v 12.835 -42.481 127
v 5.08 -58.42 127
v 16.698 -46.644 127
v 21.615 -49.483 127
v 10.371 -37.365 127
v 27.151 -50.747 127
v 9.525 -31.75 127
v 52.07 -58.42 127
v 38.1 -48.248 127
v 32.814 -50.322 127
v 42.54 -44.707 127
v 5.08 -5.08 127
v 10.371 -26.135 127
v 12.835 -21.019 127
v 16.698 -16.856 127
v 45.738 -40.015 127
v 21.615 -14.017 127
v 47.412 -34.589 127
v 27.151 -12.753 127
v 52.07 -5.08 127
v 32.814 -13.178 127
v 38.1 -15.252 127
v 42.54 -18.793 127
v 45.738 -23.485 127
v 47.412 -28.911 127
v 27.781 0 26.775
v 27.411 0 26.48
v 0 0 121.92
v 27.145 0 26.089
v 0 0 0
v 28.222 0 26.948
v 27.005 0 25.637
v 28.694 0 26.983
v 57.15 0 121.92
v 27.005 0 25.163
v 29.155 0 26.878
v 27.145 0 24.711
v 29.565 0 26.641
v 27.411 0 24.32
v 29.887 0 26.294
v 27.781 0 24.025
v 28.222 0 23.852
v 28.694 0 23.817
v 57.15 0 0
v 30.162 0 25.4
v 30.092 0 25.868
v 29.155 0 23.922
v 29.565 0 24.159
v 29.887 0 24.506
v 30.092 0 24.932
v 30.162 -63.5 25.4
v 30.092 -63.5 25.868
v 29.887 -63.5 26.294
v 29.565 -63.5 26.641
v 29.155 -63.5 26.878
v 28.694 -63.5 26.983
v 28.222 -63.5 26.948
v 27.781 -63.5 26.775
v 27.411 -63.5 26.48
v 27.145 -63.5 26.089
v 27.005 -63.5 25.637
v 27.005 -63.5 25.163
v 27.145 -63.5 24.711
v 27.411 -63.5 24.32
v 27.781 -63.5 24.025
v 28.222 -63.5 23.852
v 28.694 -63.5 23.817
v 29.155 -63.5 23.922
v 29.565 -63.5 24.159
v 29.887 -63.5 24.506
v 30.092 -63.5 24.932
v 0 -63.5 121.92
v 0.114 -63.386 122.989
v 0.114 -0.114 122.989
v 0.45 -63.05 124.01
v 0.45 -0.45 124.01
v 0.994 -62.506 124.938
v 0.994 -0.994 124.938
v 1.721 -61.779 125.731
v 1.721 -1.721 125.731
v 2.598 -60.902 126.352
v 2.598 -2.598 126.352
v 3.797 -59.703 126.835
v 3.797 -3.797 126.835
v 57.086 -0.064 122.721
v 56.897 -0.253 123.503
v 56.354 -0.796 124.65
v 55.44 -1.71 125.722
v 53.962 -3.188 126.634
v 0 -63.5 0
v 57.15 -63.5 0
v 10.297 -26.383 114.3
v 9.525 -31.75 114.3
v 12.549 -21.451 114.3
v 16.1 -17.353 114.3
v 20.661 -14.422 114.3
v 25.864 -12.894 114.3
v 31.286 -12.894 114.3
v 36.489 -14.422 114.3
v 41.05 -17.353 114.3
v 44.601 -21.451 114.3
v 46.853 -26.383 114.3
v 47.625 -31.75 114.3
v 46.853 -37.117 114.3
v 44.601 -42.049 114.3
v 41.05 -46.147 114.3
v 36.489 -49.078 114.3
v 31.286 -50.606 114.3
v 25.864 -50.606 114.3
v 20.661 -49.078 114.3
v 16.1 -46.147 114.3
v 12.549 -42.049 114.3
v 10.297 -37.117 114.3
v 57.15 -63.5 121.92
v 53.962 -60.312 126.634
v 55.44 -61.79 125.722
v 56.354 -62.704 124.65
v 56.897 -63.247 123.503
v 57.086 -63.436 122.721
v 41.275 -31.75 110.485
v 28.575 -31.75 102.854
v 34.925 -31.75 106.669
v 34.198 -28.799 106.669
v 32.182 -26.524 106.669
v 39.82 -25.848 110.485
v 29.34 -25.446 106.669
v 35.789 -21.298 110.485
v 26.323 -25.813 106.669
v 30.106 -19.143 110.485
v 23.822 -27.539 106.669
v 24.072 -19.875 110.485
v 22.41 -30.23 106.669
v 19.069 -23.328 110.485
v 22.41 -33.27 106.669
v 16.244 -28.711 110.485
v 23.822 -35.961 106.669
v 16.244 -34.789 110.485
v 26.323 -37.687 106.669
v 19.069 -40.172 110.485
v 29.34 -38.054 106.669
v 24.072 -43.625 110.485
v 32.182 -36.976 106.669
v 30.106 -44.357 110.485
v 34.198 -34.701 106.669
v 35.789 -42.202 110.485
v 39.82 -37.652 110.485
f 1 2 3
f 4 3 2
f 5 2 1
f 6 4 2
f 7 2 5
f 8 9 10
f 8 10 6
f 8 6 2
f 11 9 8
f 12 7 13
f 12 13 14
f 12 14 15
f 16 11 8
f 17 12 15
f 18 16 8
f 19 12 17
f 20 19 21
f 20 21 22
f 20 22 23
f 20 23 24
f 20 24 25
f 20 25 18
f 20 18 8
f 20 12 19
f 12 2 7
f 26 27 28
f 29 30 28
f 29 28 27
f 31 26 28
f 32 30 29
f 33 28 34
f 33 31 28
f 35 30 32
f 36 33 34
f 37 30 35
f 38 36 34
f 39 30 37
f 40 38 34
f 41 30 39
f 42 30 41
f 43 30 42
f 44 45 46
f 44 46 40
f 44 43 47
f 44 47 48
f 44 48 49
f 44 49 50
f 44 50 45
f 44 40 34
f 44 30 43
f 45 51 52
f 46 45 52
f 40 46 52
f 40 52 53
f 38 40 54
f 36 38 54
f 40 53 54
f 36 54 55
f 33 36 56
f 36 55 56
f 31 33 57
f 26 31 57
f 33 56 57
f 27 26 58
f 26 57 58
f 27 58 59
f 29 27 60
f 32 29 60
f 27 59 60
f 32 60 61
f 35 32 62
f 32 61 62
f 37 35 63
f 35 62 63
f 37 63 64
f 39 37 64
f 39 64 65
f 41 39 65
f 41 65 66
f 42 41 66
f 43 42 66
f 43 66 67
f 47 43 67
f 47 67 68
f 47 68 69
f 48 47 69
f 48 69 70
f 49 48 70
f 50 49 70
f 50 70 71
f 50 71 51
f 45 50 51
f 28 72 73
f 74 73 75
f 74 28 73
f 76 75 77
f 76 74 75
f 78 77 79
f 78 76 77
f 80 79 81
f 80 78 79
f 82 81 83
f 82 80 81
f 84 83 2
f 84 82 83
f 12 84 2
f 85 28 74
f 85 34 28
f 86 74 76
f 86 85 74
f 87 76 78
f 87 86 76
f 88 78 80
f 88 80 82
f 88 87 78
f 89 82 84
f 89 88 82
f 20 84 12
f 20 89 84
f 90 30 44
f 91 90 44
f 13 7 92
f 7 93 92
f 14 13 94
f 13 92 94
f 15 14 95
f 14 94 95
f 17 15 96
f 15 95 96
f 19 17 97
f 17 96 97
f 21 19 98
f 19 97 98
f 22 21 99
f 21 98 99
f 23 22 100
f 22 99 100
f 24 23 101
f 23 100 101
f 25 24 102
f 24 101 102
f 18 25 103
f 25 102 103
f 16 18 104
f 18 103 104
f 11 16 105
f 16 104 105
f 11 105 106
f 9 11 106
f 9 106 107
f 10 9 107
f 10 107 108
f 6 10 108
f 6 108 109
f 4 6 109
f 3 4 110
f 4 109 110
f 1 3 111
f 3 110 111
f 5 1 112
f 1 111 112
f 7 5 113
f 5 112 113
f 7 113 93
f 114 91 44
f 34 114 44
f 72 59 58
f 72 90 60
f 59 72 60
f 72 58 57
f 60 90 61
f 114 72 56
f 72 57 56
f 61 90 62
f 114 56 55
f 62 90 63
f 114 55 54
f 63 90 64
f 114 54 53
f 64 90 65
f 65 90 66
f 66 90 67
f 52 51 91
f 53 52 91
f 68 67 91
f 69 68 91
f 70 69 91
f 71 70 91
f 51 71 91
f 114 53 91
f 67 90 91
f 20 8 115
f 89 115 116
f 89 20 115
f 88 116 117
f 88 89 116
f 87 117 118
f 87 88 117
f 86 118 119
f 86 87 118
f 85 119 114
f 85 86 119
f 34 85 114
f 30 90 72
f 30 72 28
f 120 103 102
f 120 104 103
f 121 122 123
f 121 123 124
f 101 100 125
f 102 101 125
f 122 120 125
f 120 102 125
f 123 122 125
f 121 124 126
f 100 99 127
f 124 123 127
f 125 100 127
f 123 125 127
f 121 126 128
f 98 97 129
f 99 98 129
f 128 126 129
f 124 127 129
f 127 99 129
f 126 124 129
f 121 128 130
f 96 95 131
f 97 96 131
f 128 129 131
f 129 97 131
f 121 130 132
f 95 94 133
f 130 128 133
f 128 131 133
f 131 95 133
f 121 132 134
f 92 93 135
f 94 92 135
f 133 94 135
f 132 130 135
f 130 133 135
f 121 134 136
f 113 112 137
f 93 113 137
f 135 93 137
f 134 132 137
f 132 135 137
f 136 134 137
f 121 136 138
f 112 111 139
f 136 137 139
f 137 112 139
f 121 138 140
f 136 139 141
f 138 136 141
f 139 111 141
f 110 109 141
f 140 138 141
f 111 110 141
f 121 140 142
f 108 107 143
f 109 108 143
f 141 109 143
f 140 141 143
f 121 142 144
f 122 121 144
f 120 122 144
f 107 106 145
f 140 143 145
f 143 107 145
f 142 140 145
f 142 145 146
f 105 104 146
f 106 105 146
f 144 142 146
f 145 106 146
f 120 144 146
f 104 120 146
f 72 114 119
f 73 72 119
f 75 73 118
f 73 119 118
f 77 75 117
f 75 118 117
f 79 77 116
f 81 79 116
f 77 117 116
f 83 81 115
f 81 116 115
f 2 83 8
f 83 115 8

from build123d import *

# Parameters (mm, degrees)
F0_W     = 57.15
F0_H     = 63.5
F1_DEPTH = 127
F3_D     = 38.1
F3_DEPTH = 12.7
F3_TIP   = 11.4463947925
F4_R     = 5.08
F6_D     = 3.175


with BuildPart() as f1:
    # F0 (on Top) → F1 (new body)
    with BuildSketch(Plane.XY):
        with Locations((28.575, -31.75)):
            Rectangle(F0_W, F0_H)
    extrude(amount=F1_DEPTH)

    # F3
    with Locations(Plane.XY.offset(127)):
        with Locations((28.575, -31.75)):
            Hole(F3_D / 2, depth=F3_DEPTH)
            with Locations((0, 0, -(F3_DEPTH + F3_TIP / 2))):  # 118° drill point
                Cone(0, F3_D / 2, F3_TIP, mode=Mode.SUBTRACT)

    # F4
    f4_edges = [f1.edges().sort_by_distance(p)[0] for p in [
        (57.15, -31.75, 127),
        (28.575, 0, 127),
        (0, -31.75, 127),
        (28.575, -63.5, 127),
    ]]
    fillet(f4_edges, radius=F4_R)

    # F6 (through all)
    with Locations(Plane(origin=(0, 0, 0), x_dir=(-1, 0, 0), z_dir=(0, 1, 0))):
        with Locations((-28.575, 25.4)):
            Hole(F6_D / 2)


solid = f1.part
